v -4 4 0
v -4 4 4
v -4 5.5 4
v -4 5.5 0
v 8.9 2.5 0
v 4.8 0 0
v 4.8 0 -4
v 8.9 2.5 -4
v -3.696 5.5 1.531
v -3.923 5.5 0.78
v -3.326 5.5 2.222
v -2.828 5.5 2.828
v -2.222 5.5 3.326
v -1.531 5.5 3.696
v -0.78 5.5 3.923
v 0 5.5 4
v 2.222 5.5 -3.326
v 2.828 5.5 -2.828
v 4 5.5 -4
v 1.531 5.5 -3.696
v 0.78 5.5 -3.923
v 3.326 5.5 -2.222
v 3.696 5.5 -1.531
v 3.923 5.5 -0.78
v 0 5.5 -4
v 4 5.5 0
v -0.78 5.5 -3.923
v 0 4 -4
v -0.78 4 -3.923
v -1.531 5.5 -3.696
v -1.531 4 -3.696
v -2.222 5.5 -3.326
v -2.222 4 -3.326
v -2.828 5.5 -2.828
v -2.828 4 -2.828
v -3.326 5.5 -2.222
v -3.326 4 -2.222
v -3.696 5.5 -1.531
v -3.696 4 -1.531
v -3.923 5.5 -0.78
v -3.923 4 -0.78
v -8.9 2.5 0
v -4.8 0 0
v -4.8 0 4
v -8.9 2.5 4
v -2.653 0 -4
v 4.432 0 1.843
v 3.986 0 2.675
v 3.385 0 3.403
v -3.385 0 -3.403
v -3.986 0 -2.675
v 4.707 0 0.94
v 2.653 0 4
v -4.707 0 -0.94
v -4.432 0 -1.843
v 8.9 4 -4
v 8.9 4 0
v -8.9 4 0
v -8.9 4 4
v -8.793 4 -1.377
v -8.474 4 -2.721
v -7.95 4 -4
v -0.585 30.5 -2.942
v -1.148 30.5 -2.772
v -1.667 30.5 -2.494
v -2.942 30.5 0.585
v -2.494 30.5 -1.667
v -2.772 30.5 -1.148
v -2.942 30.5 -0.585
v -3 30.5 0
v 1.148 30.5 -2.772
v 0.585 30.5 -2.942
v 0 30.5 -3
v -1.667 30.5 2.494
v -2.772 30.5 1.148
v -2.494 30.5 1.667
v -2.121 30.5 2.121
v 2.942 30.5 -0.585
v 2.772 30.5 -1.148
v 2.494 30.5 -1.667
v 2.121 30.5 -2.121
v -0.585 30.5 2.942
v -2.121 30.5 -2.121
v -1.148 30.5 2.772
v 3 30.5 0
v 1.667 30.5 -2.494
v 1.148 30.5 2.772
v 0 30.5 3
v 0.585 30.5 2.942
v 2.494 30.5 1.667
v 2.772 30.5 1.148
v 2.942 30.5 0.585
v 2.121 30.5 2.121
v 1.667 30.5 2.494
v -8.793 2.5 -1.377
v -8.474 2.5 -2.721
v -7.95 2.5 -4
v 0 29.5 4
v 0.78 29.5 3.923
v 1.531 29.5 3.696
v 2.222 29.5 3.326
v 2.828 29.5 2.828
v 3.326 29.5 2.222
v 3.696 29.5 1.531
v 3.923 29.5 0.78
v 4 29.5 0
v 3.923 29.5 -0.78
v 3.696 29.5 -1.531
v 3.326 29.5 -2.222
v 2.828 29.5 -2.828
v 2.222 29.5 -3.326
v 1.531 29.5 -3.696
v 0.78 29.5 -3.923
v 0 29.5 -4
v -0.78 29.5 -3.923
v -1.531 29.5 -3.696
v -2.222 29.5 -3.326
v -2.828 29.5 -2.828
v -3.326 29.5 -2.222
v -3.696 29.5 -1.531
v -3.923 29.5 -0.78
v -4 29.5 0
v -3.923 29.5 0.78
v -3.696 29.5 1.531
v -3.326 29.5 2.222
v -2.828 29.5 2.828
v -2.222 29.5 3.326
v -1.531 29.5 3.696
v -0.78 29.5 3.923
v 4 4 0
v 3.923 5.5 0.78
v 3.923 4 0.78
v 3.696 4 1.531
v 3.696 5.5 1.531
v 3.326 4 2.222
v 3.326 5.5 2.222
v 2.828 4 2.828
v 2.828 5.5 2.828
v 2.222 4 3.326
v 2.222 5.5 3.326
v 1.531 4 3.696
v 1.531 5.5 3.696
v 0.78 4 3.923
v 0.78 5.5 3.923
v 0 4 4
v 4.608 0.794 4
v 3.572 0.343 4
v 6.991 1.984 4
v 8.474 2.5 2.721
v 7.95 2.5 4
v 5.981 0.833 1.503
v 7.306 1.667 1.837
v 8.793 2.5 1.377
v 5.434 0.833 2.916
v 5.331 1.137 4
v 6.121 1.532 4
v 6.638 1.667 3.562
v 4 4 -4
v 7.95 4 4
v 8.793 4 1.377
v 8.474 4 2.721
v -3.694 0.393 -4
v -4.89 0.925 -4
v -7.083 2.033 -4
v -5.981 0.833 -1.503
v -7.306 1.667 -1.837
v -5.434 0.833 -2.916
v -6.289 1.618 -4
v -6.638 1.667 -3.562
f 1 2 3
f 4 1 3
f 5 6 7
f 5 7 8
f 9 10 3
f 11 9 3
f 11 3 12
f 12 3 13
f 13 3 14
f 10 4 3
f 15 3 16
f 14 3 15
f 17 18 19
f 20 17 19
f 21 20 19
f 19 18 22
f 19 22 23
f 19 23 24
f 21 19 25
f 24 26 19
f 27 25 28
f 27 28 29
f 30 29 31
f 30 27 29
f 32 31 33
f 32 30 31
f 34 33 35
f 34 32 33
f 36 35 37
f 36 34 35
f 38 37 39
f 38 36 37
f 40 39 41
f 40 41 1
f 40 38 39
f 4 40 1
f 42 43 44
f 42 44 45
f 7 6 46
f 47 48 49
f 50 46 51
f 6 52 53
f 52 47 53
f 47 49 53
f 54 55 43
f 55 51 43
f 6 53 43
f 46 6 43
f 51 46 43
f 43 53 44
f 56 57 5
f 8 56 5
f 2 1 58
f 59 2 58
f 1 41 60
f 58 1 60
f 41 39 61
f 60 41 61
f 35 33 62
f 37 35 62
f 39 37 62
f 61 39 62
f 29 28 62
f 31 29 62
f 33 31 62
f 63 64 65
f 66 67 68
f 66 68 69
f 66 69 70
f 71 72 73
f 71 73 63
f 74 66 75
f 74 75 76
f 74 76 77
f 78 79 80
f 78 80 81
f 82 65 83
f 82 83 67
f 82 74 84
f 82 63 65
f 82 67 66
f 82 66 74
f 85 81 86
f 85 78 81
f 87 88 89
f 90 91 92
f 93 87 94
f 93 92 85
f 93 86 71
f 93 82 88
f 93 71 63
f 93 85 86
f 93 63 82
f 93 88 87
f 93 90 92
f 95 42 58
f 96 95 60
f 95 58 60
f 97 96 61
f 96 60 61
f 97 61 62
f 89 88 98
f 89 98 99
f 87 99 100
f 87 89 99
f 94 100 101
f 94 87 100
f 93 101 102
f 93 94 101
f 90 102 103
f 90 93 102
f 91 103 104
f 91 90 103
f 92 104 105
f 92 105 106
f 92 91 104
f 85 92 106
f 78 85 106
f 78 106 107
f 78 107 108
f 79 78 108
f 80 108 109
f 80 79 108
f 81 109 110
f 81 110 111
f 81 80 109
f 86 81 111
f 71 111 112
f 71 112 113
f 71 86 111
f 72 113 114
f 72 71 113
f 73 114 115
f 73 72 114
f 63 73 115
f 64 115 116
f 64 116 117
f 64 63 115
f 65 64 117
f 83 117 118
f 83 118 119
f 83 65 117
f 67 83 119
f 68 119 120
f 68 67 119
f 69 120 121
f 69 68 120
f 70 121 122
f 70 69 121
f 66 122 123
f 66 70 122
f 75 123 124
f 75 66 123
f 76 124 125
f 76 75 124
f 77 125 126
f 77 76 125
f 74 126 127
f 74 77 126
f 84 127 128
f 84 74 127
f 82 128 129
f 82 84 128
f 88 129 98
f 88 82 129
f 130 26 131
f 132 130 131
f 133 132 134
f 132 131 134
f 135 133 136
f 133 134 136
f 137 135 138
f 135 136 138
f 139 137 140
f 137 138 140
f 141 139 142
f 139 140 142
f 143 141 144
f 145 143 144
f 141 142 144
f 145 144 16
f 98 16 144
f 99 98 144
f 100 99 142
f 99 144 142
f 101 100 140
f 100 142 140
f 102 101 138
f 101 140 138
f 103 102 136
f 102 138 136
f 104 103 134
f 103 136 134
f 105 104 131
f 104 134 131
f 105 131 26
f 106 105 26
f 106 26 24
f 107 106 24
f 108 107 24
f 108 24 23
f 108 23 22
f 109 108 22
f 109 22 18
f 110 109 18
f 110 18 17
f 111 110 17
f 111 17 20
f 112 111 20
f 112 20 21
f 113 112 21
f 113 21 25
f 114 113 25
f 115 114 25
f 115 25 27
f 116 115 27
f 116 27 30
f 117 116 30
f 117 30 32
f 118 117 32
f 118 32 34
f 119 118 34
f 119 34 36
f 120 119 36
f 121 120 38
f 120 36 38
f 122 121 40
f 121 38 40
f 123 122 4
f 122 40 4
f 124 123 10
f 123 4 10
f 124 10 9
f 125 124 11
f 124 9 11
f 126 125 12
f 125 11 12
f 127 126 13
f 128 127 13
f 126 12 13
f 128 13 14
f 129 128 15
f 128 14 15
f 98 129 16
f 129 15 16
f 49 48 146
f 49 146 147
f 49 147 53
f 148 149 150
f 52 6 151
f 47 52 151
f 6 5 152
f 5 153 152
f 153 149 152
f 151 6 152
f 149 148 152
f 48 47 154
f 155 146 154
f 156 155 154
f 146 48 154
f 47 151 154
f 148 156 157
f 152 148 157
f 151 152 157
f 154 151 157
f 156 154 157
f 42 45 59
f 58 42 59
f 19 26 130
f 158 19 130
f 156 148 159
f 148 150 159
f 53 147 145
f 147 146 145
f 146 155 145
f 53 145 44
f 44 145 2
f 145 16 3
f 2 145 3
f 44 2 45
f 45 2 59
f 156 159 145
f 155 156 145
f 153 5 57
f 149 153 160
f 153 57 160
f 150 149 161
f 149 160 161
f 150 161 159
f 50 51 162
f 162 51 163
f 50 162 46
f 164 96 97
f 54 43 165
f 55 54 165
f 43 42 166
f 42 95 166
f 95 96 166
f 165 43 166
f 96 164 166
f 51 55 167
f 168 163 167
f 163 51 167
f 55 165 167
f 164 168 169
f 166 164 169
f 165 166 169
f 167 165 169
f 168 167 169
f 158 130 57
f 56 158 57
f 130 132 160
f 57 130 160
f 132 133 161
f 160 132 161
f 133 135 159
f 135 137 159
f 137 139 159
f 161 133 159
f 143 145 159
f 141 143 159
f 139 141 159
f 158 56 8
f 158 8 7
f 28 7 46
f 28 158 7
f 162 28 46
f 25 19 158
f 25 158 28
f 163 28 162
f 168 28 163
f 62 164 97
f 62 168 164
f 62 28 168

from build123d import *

# Parameters (mm, degrees)
EXTRUDE_1_DEPTH     = 4
CUT_EXTRUDE_1_DEPTH = 1.5
SKETCH_2_R          = 4
EXTRUDE_2_DEPTH     = 25
CUT_EXTRUDE_2_DEPTH = 5
CHAMFER_2_SIZE      = 1


with BuildPart() as part:
    # Эскиз1 → Бобышка-Вытянуть1 (new body, symmetric)
    with BuildSketch(Plane.XY):
        Polygon((8.9, 0), (-8.9, 0), (-8.9, 4), (-4, 4), (-4, 5.5), (4, 5.5), (4, 4), (8.9, 4), align=None)
    extrude(amount=EXTRUDE_1_DEPTH, both=True)

    # Эскиз3 → Вырез-Вытянуть1 (cut)
    with BuildSketch(Plane(origin=(0, 5.5, 0), x_dir=(1, 0, 0), z_dir=(0, 1, 0))):
        with BuildLine():
            Line((-4, 0), (-4, 4))
            Line((-4, 4), (0, 4))
            ThreePointArc((0, 4), (-2.828427125, 2.828427125), (-4, 0))
        make_face()
        with BuildLine():
            Line((0, -4), (4, -4))
            Line((4, -4), (4, 0))
            ThreePointArc((4, 0), (2.828427125, -2.828427125), (0, -4))
        make_face()
    extrude(amount=-CUT_EXTRUDE_1_DEPTH, mode=Mode.SUBTRACT)

    # Эскиз2 → Бобышка-Вытянуть2 (add)
    with BuildSketch(Plane(origin=(0, 5.5, 0), x_dir=(1, 0, 0), z_dir=(0, 1, 0))):
        with Locations(Location((0, 0, 0), (0, 0, 270))):  # turned: the seam where the file's is
            Circle(SKETCH_2_R)
    extrude(amount=EXTRUDE_2_DEPTH)

    # Эскиз4 → Вырез-Вытянуть2 (cut, through all)
    with BuildSketch(Plane(origin=(0, 4, 0), x_dir=(1, 0, 0), z_dir=(0, 1, 0))):
        with BuildLine():
            Line((-7.950471684, 4), (-8.9, 4))
            Line((-8.9, 4), (-8.9, 0))
            ThreePointArc((-8.9, 0), (-8.659364815, 2.055578022), (-7.950471684, 4))
        make_face()
        with BuildLine():
            Line((7.950471684, -4), (8.9, -4))
            Line((8.9, -4), (8.9, 0))
            ThreePointArc((8.9, 0), (8.659364815, -2.055578022), (7.950471684, -4))
        make_face()
    extrude(amount=-CUT_EXTRUDE_2_DEPTH, mode=Mode.SUBTRACT)

    # Вырез-По траектории1: sweep along a path in Эскиз6
    with BuildLine(Plane.XZ) as sweep_1_path:
        Line((0, -8.9), (8.9, -8.9))
        Line((8.9, -8.9), (8.9, 0))
        ThreePointArc((8.9, 0), (6.293250353, 6.293250353), (0, 8.9))
        Line((0, 8.9), (-8.9, 8.9))
        Line((-8.9, 8.9), (-8.9, 0))
        ThreePointArc((-8.9, 0), (-6.293250353, -6.293250353), (0, -8.9))
    # Эскиз5 → Вырез-По траектории1 (sweep, cut)
    with BuildSketch(Plane.XY.offset(4)):
        Polygon((-8.9, 2.5), (-4.8, 0), (-8.9, 0), align=None)
    sweep(path=sweep_1_path.line, transition=Transition.RIGHT, mode=Mode.SUBTRACT)

    # Фаска2
    chamfer_2_edges = [part.edges().sort_by_distance(p)[0] for p in [
        (0, 30.5, -4),
    ]]
    chamfer(chamfer_2_edges, length=CHAMFER_2_SIZE)


solid = part.part
